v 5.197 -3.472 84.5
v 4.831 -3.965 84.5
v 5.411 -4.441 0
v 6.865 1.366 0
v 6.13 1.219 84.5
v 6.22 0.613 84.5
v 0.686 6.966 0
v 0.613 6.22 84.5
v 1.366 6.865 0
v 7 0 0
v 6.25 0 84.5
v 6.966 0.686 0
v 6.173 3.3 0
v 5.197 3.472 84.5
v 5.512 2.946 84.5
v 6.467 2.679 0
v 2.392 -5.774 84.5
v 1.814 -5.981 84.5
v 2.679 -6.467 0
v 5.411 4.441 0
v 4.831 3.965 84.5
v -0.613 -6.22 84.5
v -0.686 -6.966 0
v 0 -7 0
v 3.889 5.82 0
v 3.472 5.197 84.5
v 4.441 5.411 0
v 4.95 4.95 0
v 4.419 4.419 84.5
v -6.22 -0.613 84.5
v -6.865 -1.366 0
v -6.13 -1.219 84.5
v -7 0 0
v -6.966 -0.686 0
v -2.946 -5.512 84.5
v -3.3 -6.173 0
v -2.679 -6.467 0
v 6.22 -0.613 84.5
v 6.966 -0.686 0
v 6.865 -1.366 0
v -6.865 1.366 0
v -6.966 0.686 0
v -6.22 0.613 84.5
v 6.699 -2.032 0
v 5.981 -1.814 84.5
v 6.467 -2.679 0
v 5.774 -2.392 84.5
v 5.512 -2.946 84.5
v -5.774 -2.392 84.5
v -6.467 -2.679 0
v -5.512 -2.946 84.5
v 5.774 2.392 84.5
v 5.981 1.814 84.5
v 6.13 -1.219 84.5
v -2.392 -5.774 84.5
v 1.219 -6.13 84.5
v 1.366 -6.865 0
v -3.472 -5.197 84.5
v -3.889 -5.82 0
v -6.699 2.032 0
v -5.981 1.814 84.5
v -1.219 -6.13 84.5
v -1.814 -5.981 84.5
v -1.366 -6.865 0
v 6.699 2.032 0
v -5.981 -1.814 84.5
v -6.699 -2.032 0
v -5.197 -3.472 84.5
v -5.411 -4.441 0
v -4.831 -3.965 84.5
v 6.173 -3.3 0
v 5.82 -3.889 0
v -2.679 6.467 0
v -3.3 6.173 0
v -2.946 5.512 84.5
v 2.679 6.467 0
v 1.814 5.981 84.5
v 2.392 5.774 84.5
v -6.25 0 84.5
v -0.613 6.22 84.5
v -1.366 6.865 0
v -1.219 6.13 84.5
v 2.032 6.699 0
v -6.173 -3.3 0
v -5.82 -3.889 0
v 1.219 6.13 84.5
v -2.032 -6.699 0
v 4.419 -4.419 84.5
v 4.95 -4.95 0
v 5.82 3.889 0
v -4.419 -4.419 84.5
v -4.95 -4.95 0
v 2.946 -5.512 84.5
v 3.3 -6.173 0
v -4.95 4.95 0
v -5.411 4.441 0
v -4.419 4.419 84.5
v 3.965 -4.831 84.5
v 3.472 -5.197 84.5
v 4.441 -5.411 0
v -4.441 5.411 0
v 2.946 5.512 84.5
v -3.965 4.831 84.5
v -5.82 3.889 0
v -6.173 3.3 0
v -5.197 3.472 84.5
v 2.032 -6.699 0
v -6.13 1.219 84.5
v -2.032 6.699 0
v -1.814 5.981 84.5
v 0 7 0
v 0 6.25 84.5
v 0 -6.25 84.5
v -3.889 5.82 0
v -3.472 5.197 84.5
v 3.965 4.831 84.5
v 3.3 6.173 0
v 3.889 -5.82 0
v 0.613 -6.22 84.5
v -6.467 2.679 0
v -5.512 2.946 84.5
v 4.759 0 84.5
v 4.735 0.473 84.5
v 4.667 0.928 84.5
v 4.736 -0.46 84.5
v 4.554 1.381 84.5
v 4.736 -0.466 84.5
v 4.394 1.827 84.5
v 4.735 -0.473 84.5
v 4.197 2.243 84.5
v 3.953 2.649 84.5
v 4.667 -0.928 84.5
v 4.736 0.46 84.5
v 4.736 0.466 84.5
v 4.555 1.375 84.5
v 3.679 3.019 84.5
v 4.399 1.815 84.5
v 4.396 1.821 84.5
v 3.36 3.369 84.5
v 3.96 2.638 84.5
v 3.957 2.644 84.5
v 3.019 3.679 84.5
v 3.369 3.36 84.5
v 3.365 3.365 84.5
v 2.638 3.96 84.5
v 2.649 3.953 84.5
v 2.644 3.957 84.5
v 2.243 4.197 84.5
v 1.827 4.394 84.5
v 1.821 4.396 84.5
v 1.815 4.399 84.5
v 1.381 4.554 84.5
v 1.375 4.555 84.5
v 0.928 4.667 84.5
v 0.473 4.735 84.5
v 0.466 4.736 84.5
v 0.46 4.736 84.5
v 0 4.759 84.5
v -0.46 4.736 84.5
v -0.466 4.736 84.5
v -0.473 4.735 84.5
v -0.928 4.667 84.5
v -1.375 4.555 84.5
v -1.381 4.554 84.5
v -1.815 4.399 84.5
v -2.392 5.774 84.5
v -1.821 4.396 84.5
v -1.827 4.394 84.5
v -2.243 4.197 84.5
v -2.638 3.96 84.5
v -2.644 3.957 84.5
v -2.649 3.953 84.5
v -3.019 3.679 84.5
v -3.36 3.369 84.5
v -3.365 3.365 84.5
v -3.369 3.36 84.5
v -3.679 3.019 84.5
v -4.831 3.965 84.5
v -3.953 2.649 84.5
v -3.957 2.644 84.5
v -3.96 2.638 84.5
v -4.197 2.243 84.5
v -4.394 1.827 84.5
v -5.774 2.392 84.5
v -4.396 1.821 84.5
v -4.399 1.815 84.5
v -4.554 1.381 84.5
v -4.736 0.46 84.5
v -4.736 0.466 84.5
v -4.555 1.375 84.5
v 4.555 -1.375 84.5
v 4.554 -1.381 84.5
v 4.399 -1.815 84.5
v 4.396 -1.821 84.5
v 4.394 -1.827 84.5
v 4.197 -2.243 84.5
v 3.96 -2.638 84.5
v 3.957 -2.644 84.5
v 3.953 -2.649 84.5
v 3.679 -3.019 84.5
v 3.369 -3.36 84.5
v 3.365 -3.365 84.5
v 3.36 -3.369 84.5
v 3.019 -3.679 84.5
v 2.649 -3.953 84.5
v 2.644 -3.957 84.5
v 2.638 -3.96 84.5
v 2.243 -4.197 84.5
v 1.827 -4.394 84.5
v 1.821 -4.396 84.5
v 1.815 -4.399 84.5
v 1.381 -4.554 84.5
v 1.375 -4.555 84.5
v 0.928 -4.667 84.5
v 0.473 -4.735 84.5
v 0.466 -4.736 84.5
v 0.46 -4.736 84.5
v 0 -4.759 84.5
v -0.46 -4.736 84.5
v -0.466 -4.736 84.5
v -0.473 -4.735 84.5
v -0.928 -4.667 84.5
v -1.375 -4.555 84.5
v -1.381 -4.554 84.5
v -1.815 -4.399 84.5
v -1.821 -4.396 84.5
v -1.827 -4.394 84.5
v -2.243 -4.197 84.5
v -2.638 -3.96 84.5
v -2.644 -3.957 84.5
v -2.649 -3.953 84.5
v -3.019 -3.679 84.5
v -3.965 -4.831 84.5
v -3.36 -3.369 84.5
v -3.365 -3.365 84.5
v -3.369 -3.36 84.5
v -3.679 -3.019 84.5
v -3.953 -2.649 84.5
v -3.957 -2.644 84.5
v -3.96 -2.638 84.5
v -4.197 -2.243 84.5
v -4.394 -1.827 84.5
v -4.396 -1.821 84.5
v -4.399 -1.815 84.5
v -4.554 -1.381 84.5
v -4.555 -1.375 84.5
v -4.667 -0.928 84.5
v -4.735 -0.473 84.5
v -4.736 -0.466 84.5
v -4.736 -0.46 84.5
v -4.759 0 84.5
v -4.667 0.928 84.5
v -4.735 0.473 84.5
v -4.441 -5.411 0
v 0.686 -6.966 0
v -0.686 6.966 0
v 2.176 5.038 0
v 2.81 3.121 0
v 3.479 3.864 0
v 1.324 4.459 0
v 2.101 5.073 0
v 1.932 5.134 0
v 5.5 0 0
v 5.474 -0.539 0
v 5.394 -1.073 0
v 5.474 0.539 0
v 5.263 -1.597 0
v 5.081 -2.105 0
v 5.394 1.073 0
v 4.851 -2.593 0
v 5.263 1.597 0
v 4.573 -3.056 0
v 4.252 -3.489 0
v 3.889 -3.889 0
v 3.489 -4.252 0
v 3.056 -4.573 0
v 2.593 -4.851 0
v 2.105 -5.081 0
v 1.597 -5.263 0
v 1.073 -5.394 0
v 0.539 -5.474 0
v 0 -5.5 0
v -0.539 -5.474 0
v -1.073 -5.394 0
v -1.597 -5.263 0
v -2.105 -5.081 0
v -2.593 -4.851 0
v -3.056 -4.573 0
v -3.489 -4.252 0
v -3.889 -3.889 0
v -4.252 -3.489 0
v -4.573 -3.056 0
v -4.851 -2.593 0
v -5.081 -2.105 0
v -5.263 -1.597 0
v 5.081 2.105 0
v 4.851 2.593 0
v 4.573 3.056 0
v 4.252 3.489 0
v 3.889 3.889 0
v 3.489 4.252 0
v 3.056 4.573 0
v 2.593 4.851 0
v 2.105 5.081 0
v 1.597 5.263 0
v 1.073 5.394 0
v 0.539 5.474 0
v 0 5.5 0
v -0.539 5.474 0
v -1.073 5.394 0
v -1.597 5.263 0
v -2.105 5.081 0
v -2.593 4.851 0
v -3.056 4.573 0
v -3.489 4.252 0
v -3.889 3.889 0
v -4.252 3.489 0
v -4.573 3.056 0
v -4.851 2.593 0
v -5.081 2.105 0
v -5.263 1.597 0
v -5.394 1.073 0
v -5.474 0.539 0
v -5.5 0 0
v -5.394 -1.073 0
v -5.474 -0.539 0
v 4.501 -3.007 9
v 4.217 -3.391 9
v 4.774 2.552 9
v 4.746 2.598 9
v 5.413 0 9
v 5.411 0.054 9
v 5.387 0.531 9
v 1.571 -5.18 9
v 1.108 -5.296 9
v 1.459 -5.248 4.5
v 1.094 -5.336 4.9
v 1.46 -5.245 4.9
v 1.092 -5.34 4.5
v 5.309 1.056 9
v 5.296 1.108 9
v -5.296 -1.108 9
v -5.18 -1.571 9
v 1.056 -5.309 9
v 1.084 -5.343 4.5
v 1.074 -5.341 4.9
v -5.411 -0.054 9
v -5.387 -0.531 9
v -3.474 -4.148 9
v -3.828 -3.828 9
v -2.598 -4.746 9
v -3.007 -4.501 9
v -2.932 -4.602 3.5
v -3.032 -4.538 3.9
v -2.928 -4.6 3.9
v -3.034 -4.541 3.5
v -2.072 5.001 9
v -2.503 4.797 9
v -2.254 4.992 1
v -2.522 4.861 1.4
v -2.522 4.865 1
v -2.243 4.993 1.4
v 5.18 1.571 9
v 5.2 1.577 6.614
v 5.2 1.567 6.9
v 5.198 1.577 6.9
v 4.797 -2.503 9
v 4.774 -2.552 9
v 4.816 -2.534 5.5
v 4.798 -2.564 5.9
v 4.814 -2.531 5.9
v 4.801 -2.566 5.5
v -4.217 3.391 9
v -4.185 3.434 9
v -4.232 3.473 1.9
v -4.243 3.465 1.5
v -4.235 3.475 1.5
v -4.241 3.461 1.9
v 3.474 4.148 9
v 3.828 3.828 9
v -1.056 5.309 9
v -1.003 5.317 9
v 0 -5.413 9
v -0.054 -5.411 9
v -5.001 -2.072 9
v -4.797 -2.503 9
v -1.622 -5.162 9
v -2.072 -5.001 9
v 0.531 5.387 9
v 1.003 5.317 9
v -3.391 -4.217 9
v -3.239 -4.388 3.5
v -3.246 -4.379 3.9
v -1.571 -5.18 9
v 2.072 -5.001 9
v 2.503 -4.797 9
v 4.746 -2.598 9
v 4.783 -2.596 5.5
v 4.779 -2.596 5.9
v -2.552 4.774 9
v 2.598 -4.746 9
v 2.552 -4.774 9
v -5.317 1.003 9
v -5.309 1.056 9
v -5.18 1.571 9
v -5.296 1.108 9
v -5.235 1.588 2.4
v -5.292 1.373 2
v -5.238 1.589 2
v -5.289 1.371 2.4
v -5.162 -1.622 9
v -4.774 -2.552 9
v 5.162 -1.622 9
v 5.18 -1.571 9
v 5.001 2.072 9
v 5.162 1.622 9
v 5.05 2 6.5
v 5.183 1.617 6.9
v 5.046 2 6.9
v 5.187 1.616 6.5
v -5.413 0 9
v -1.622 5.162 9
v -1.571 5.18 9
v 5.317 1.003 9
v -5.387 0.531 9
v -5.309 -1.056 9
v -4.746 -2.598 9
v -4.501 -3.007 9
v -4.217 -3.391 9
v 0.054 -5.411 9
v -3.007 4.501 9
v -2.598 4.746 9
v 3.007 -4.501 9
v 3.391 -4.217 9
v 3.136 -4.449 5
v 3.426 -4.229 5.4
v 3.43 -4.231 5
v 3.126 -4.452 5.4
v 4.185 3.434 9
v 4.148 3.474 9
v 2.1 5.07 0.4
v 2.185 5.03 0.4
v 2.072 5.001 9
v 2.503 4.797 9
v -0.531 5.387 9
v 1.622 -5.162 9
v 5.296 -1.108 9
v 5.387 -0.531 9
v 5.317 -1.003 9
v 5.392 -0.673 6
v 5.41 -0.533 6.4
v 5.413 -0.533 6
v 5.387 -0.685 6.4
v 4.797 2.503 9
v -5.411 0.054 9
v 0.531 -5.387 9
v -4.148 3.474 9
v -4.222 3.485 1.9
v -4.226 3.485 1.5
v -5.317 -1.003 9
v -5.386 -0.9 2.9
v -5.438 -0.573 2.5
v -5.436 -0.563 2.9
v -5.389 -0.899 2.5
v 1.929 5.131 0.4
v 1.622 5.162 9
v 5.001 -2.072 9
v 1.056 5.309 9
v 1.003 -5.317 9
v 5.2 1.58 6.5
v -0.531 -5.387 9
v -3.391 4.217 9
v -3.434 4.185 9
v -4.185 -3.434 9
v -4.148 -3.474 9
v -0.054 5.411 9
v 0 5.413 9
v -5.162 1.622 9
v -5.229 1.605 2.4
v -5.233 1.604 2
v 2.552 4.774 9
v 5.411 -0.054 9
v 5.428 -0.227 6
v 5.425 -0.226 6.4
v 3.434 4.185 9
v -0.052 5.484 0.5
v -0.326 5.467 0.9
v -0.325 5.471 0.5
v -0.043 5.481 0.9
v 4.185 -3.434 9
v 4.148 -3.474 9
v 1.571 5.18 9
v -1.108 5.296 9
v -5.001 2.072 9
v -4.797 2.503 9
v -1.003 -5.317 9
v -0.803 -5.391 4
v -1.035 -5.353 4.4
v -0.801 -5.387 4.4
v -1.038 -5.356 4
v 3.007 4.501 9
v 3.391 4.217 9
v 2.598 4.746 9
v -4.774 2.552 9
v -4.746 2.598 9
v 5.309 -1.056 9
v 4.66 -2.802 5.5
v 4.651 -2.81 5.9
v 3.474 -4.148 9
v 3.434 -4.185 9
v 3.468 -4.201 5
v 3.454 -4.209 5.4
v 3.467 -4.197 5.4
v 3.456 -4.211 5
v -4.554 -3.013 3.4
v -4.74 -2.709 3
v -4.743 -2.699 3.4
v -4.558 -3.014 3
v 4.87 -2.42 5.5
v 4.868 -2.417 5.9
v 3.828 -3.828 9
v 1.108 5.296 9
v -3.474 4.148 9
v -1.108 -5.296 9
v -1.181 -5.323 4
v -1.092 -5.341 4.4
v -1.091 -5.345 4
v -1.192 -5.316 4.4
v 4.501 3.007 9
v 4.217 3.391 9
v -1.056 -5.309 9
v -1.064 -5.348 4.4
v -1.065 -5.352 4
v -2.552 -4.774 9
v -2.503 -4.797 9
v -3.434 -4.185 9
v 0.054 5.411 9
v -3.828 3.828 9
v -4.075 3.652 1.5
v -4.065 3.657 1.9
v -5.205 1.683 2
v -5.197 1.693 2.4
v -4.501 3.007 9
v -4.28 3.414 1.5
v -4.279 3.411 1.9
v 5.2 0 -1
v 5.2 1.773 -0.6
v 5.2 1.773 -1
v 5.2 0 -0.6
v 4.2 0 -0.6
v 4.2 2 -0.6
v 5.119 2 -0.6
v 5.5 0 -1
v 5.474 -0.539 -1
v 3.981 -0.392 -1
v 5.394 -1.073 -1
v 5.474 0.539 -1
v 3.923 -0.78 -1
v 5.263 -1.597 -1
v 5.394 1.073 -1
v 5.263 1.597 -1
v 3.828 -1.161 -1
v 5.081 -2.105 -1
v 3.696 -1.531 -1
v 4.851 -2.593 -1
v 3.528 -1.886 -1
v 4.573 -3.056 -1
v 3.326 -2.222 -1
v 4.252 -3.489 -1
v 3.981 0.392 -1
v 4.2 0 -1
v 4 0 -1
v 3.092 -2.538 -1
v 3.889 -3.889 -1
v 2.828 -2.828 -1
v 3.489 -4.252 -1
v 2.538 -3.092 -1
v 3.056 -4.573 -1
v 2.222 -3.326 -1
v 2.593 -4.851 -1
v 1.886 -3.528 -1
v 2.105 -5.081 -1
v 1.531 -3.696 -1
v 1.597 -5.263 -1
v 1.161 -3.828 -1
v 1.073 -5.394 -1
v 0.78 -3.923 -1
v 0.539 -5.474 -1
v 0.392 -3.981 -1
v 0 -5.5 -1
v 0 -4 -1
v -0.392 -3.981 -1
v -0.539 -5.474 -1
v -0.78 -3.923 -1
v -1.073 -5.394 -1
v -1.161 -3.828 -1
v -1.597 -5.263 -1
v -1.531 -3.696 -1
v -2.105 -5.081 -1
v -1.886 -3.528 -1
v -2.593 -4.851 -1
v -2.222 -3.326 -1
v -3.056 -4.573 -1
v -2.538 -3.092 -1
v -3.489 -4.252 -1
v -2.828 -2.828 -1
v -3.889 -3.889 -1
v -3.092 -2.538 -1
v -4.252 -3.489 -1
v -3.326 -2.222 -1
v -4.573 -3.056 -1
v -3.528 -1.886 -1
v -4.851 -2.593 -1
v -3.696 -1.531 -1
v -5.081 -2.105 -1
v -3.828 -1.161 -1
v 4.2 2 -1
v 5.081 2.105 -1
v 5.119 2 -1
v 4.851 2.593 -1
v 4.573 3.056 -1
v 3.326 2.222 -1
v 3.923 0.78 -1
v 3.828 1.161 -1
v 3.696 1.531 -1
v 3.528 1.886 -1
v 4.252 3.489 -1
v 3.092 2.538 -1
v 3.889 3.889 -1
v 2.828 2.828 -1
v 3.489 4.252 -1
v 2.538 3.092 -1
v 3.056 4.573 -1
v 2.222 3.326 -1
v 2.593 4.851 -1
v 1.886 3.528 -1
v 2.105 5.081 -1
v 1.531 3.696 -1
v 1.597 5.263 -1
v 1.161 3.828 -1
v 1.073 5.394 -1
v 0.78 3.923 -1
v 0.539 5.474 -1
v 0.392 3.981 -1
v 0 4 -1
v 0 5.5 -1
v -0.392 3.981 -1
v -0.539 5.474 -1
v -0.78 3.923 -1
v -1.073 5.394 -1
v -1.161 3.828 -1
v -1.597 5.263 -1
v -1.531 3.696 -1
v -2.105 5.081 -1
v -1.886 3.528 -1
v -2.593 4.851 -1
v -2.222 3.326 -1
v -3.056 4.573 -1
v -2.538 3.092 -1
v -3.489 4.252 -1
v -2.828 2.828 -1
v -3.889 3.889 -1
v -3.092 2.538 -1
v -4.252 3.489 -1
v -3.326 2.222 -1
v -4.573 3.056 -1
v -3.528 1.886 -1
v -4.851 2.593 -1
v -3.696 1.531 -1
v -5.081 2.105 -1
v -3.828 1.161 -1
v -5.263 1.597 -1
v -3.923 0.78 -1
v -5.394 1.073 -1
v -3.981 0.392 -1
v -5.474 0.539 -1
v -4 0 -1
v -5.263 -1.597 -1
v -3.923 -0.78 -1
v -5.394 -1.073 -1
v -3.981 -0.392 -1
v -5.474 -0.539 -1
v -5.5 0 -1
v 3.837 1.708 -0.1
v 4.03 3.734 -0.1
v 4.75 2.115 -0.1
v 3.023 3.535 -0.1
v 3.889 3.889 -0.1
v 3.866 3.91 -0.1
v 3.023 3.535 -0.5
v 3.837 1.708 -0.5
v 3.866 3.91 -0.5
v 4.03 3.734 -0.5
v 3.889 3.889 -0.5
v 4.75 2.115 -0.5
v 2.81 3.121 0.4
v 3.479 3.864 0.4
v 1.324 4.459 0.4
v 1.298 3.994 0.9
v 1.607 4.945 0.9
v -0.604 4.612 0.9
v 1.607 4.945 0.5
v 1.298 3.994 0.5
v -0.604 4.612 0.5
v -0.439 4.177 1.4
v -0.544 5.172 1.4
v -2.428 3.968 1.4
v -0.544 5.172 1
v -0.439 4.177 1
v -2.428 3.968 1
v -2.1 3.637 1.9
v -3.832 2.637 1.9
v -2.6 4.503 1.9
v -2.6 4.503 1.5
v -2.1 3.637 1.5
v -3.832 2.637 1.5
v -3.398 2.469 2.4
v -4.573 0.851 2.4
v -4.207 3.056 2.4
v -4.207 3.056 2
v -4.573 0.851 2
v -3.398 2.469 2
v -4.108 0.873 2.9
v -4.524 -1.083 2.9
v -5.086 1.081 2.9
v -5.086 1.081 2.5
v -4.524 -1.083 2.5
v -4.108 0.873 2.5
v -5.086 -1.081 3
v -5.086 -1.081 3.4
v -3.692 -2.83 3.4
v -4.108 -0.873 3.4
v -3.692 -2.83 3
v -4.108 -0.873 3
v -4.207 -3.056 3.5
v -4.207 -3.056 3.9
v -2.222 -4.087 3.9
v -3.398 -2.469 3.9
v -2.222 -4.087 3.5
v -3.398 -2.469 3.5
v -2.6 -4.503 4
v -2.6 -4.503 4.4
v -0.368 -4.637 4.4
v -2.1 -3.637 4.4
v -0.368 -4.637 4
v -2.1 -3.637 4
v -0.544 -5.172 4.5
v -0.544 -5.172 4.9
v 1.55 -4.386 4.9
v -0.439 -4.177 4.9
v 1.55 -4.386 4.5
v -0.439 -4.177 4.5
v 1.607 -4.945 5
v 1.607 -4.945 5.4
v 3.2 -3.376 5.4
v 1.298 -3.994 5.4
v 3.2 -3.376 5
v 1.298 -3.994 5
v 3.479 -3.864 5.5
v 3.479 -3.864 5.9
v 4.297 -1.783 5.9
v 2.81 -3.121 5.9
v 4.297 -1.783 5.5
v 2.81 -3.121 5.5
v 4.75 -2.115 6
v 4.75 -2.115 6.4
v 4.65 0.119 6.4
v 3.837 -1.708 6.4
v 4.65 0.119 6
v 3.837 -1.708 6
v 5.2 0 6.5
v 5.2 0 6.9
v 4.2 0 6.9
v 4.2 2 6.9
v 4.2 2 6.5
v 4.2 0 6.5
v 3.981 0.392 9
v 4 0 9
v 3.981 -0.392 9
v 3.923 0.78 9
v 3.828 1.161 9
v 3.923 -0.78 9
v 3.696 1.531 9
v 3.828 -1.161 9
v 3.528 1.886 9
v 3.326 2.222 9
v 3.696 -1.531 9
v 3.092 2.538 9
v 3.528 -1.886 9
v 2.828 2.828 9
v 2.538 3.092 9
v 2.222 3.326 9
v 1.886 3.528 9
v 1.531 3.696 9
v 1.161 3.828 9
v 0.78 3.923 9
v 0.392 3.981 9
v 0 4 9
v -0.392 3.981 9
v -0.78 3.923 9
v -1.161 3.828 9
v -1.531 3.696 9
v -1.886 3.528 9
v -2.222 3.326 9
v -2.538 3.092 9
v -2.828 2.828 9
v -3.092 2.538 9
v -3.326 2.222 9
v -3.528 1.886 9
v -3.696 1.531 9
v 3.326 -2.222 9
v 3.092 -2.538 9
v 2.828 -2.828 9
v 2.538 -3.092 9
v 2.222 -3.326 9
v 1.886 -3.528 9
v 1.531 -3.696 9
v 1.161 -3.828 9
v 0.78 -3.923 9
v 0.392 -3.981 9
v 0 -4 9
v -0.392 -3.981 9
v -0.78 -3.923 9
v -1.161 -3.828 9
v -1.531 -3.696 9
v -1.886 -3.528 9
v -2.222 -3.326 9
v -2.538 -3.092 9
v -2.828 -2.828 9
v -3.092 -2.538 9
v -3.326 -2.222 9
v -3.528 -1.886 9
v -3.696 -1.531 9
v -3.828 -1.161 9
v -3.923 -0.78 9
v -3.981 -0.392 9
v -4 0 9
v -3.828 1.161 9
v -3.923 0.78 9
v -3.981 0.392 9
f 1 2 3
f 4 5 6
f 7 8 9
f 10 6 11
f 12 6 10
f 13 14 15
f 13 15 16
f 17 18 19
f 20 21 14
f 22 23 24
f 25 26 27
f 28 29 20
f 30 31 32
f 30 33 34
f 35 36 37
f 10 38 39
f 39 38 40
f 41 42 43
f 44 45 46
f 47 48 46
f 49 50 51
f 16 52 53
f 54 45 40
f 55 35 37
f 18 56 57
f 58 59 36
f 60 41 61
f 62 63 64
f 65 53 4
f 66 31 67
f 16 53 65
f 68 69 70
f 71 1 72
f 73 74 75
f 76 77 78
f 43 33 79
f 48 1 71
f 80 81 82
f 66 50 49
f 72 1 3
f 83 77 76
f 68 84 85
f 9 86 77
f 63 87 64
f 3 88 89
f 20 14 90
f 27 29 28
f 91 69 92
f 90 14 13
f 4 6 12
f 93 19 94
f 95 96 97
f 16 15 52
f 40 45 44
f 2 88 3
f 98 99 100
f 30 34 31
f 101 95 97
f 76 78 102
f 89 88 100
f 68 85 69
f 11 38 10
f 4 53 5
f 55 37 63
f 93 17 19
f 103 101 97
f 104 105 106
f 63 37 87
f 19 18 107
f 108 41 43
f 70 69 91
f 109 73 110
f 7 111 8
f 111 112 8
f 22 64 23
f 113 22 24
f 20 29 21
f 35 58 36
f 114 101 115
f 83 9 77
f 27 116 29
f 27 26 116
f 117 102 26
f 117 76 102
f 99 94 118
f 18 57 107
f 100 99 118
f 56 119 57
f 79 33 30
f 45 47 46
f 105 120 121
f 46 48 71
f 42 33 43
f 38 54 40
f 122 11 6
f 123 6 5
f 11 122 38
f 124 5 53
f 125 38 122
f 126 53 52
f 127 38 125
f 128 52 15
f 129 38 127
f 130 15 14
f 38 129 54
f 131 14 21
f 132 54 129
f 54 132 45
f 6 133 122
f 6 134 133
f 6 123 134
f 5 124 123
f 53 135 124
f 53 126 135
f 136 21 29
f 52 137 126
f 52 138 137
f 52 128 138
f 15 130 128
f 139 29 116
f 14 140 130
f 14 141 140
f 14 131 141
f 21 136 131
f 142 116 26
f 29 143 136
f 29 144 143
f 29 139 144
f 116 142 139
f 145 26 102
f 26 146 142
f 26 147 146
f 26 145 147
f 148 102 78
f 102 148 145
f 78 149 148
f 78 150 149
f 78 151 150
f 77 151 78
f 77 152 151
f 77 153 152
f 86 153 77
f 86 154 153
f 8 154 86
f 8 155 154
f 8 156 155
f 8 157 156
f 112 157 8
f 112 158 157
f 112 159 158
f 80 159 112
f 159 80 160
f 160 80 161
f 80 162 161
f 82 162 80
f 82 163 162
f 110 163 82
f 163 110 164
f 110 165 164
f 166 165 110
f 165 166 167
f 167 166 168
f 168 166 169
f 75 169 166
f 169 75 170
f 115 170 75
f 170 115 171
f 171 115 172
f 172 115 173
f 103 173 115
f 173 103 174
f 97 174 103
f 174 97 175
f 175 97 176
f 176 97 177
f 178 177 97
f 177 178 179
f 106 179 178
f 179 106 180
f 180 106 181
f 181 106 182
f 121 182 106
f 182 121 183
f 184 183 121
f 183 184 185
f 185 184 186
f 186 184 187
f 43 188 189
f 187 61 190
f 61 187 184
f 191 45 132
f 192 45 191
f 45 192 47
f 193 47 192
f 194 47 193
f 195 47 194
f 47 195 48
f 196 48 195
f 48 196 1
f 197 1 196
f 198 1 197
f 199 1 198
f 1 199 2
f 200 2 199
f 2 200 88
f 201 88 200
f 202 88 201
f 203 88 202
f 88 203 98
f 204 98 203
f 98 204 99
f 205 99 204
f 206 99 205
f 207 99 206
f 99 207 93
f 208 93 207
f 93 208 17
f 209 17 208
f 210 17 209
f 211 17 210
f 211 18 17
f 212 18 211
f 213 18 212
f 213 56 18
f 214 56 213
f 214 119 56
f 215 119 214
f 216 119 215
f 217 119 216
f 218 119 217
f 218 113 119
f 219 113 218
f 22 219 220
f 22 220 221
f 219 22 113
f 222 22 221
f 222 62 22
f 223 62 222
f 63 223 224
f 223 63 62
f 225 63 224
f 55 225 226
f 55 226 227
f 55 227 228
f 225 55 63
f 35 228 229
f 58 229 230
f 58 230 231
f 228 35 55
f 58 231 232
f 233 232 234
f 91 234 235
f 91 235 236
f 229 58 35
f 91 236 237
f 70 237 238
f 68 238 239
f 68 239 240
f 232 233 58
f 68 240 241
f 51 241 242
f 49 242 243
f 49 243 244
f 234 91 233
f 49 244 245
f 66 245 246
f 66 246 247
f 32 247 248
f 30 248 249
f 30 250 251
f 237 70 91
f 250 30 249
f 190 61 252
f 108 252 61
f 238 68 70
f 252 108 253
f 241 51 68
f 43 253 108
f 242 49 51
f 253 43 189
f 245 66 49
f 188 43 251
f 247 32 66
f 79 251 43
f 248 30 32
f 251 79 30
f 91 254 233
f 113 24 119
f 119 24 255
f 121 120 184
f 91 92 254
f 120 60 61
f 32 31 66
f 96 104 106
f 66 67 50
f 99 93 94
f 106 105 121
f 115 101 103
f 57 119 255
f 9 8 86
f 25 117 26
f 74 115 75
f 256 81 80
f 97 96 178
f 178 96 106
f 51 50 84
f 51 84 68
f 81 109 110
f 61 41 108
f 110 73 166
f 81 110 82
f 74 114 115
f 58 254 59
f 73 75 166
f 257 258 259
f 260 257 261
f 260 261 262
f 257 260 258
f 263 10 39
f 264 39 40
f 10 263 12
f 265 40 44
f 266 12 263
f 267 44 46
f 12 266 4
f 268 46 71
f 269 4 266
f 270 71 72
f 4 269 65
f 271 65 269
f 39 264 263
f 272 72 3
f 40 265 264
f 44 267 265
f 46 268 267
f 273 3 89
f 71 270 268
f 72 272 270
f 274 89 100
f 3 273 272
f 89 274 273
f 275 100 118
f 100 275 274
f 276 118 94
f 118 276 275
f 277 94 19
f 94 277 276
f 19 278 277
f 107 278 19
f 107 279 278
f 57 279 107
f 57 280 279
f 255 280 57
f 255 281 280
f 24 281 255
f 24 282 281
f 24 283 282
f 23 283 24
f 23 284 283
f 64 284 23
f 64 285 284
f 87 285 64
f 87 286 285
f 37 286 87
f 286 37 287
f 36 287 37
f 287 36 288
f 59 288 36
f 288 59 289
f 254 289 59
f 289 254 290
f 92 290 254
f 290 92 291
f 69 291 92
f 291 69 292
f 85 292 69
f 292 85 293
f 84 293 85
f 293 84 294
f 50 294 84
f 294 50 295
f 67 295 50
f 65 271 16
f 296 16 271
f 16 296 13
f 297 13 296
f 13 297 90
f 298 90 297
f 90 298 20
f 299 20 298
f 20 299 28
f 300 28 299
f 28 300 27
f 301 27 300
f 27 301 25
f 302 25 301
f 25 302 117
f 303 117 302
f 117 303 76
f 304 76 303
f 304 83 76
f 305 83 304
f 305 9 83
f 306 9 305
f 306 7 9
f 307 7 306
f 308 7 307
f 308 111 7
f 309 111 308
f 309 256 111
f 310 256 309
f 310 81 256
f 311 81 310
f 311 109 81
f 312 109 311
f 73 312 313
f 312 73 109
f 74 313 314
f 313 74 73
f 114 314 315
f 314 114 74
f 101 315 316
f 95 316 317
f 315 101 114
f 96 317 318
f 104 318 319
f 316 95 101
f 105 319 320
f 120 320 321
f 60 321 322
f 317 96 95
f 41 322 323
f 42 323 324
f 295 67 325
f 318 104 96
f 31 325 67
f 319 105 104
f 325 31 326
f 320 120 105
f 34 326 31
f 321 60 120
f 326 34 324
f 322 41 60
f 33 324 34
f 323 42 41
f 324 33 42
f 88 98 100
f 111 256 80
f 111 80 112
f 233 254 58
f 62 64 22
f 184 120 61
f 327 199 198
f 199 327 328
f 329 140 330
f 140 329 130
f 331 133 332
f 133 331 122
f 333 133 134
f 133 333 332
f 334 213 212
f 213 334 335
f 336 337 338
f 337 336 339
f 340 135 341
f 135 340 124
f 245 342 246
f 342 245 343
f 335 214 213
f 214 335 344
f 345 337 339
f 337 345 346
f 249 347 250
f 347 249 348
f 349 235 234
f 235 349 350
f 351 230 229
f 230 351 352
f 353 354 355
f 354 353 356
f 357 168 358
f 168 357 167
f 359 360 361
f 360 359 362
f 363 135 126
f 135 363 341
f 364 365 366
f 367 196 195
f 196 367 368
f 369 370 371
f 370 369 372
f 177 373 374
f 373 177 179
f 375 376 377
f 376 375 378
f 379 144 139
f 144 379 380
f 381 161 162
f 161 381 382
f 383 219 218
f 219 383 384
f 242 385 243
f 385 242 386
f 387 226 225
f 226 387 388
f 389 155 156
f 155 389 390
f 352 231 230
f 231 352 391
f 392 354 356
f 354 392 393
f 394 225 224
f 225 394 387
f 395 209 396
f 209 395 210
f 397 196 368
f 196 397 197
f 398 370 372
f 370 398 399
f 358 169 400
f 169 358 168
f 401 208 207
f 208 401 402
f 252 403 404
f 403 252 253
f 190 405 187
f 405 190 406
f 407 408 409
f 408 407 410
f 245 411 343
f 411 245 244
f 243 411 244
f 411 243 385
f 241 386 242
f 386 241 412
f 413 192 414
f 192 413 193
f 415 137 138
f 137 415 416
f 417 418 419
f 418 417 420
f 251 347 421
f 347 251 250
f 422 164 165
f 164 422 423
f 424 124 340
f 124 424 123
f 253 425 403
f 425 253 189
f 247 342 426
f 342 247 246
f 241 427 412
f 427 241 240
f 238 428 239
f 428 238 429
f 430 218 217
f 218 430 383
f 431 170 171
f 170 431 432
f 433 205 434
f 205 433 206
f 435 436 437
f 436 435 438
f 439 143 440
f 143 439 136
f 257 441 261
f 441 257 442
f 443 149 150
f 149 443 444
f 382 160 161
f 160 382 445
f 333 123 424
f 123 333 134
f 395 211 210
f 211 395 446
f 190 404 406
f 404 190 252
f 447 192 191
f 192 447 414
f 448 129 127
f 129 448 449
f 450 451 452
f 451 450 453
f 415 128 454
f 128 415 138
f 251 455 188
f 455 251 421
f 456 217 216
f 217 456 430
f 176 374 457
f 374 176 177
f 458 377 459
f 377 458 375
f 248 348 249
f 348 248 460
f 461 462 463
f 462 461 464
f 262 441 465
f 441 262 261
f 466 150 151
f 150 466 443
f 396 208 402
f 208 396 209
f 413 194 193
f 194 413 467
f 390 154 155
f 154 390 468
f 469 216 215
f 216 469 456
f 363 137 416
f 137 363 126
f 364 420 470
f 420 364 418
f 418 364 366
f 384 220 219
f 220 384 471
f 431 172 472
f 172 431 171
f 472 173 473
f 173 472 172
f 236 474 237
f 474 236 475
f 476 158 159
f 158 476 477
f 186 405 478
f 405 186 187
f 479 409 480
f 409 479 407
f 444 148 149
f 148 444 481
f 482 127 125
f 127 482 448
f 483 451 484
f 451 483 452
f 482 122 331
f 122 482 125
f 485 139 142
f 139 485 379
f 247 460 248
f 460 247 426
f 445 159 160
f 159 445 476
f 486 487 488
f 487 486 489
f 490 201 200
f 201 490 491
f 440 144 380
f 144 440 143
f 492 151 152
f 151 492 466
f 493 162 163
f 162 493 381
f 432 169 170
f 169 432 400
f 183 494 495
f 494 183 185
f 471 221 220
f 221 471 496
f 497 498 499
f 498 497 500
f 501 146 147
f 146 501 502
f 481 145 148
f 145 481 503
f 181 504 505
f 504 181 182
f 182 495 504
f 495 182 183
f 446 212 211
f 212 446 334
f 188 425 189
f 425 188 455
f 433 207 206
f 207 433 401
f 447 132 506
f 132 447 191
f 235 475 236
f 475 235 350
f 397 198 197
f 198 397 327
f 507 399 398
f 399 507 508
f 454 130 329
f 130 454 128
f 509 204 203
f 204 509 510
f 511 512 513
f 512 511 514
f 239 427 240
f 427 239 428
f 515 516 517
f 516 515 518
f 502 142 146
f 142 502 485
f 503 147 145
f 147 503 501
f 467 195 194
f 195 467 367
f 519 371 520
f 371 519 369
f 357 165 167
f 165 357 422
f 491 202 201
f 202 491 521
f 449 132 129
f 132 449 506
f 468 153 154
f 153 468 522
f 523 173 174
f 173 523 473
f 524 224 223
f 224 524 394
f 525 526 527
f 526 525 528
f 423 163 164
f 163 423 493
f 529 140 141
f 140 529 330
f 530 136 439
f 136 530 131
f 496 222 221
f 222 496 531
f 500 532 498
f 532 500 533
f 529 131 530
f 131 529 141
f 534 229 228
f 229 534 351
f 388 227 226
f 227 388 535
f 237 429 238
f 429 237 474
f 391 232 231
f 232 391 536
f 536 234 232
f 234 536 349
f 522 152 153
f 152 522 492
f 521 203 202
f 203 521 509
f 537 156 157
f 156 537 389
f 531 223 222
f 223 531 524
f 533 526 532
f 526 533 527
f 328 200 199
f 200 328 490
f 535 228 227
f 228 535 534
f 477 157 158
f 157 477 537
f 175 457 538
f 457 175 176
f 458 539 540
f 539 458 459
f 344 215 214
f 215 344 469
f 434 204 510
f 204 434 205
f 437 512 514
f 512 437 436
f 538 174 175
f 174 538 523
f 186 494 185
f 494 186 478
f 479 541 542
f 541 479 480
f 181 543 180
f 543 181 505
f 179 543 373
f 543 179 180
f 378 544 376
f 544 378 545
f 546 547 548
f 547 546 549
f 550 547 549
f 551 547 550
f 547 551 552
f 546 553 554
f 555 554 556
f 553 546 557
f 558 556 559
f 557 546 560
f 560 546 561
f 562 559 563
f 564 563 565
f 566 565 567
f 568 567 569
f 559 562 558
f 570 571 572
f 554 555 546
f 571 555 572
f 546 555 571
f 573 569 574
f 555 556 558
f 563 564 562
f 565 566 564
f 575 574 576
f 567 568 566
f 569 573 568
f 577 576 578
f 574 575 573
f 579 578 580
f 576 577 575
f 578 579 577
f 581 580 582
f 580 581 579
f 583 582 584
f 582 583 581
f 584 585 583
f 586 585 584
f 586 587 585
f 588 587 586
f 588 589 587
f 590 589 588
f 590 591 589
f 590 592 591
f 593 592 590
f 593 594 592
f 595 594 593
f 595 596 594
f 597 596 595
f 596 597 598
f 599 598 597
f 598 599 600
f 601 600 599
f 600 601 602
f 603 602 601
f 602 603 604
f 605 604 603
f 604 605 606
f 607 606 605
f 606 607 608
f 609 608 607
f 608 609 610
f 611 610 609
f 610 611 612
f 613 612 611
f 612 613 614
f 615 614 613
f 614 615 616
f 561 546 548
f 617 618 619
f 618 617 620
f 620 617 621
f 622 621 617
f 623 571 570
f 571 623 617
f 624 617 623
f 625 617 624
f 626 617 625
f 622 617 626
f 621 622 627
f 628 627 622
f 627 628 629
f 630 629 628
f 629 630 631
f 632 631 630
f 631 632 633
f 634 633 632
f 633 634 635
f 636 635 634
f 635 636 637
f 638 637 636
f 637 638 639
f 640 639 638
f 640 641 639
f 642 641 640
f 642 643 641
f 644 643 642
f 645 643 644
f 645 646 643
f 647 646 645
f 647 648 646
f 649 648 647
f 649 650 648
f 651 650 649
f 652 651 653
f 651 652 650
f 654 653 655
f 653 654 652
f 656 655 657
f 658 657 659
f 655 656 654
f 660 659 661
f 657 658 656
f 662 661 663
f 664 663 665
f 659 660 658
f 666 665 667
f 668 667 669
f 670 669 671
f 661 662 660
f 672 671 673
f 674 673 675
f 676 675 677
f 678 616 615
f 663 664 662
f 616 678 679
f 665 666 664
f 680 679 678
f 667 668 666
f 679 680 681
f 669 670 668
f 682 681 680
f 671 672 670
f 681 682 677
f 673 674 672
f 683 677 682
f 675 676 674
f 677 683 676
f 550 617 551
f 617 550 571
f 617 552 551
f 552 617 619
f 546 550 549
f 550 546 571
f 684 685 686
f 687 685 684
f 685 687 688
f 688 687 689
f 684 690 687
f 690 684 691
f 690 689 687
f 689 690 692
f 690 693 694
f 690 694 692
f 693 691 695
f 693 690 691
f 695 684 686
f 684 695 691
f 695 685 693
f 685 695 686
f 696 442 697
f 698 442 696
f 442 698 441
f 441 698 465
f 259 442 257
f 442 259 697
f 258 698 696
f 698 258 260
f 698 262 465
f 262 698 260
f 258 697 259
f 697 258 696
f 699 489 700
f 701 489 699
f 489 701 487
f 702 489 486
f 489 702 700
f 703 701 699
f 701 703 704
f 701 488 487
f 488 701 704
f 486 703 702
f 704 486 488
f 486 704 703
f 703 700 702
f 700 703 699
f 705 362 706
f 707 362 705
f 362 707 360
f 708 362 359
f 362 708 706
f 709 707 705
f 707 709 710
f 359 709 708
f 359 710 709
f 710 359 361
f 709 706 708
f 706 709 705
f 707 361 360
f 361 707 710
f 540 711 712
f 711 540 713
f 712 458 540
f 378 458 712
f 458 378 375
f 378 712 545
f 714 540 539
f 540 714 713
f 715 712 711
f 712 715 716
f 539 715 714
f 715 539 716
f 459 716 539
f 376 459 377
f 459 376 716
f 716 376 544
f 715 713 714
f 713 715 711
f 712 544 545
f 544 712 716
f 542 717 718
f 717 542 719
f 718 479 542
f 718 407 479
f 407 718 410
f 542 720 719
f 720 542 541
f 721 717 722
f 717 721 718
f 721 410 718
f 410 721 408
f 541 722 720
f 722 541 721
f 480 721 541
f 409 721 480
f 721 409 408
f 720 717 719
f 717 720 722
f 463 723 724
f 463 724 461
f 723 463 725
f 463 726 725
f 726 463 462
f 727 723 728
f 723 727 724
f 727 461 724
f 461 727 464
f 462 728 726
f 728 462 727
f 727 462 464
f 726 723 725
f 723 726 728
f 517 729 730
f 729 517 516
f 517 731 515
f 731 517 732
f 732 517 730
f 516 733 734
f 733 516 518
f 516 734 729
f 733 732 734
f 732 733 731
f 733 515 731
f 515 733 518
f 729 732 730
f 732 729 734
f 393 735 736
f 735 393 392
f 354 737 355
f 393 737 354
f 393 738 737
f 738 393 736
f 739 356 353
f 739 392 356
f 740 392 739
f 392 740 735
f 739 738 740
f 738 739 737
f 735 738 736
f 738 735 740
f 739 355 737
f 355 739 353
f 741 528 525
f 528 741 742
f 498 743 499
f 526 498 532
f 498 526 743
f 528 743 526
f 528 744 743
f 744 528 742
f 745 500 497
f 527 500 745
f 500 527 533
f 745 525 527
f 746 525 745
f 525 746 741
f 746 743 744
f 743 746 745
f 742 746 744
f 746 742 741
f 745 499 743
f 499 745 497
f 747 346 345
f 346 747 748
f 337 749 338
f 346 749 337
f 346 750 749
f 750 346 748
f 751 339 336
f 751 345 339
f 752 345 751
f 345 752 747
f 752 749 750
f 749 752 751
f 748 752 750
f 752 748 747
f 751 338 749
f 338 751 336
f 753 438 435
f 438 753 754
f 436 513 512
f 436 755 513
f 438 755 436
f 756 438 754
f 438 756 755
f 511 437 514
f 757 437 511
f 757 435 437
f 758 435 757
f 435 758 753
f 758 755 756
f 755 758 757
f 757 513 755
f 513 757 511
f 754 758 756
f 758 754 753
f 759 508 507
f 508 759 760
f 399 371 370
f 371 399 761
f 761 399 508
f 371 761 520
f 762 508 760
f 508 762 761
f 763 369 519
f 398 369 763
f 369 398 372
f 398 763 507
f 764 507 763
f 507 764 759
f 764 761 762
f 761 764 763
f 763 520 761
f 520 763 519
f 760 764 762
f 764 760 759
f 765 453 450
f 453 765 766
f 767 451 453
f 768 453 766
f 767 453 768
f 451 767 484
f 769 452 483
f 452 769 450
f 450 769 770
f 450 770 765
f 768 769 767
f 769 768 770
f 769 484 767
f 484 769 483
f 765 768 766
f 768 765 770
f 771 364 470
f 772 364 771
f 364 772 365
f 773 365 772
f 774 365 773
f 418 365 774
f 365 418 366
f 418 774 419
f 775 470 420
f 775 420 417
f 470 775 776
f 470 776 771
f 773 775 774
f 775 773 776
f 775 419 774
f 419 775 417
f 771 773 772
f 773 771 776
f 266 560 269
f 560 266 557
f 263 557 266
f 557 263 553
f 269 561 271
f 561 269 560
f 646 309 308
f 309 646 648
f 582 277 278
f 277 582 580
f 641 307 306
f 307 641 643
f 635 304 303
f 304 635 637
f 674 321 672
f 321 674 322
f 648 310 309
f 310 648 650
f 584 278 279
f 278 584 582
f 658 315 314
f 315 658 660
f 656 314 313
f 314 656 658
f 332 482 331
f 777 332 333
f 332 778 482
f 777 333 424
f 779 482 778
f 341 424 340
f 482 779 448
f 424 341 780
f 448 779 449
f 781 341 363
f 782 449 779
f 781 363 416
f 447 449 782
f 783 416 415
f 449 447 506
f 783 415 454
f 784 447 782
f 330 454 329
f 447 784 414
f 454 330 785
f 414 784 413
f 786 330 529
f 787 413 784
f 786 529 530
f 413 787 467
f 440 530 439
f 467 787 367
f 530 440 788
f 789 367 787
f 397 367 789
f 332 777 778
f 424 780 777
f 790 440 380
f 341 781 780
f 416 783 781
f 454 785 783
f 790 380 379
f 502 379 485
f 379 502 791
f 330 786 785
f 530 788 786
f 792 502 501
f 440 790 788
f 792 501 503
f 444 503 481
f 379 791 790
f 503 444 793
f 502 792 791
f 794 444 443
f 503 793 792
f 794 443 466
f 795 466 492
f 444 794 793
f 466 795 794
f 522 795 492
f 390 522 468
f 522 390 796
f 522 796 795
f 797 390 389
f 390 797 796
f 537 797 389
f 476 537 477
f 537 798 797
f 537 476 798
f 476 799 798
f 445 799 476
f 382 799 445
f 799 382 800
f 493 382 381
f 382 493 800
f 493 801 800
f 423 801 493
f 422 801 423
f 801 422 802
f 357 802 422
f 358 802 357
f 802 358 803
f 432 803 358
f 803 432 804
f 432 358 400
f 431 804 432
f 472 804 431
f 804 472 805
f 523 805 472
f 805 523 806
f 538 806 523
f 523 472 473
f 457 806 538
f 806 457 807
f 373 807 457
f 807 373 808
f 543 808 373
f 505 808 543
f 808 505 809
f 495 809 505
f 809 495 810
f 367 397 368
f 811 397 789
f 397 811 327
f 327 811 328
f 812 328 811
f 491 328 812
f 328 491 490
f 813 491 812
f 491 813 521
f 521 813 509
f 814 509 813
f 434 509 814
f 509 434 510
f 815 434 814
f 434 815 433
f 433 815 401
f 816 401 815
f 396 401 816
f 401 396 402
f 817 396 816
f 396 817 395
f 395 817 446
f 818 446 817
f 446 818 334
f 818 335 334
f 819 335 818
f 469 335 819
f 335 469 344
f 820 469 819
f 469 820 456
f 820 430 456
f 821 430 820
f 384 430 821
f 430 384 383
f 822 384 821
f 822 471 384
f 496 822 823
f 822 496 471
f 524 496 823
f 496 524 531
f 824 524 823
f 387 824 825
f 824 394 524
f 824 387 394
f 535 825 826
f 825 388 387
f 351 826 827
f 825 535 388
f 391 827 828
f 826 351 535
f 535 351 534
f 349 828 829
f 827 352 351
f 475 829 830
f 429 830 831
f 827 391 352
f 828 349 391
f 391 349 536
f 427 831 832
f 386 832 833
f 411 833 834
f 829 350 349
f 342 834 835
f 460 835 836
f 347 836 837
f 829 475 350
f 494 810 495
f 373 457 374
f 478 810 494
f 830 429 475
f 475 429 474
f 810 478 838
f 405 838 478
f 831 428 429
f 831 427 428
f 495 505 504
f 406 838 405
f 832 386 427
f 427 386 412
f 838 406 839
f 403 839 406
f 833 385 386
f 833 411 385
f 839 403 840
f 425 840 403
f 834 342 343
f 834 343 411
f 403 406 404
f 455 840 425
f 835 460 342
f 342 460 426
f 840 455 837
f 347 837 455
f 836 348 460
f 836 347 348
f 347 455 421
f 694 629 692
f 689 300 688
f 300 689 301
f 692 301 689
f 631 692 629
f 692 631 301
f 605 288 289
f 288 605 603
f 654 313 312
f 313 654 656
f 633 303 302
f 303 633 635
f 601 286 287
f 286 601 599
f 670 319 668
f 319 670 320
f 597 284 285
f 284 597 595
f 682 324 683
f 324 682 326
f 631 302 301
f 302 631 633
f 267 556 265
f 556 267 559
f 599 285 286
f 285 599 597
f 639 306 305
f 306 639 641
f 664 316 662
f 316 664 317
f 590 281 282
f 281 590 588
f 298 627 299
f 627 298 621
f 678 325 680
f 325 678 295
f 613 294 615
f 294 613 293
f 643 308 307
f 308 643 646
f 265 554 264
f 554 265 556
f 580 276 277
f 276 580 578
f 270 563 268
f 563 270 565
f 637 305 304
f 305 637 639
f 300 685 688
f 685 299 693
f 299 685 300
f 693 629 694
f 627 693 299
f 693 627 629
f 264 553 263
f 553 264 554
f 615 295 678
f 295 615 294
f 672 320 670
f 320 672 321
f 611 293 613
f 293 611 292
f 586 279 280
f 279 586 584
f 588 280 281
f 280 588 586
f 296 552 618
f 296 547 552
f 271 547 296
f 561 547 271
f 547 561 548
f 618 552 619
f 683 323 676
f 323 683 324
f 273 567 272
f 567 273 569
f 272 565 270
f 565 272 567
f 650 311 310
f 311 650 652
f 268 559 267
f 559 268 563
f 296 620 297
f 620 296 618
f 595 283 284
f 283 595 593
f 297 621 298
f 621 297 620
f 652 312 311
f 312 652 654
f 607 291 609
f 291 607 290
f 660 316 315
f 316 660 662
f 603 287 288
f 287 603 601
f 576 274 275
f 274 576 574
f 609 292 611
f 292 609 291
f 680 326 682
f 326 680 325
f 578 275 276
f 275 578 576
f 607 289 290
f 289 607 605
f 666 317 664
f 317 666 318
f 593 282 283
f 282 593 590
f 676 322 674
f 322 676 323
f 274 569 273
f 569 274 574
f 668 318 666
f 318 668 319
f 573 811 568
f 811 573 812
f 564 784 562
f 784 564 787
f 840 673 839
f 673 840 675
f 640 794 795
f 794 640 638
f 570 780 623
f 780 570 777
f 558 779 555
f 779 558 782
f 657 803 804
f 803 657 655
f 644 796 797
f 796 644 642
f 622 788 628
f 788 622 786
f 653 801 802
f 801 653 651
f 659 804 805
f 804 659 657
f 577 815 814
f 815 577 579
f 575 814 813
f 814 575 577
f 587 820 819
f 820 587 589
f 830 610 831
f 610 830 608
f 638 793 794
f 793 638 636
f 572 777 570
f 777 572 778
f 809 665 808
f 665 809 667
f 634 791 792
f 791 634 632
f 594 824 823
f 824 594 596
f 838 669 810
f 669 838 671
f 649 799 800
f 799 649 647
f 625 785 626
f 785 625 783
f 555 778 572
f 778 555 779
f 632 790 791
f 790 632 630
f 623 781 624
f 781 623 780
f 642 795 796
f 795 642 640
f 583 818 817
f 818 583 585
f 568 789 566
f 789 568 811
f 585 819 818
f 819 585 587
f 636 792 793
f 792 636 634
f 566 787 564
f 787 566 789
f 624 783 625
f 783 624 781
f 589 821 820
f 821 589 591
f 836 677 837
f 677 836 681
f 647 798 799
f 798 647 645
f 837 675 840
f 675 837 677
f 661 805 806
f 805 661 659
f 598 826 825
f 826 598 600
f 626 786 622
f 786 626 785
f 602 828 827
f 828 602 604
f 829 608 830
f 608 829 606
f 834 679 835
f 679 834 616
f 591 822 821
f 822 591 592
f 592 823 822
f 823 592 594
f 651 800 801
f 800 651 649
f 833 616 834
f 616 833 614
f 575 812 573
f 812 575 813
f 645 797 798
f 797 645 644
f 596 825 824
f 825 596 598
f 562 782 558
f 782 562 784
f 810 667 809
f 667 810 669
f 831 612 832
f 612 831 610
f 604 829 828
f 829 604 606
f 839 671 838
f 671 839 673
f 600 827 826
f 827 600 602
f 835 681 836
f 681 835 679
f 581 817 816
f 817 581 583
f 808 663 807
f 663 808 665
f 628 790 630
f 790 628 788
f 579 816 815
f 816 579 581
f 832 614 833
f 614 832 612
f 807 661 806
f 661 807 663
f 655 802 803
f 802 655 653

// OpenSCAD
// CyberWand v21.0 - 杖身 OpenSCAD 模型
// 用于 3D 打印的 STL 文件生成（分段设计，便于打印）

// 参数设置
shaft_total_length = 338;  // 杖身总长度 mm（350-12 手柄）
shaft_segments = 4;        // 分段数量
segment_length = shaft_total_length / shaft_segments;  // 每段长度约 84.5mm

shaft_base_diameter = 14;   // 底部外径 mm
shaft_tip_diameter = 8;     // 顶端外径 mm
shaft_inner_diameter = 11;  // 底部内径 mm（容纳电池）
shaft_tip_inner_diameter = 5; // 顶端内径 mm

wall_thickness = 1.5;       // 壁厚 mm

// 螺纹连接参数
male_thread_diameter = 8;
female_thread_diameter = 8.5;
thread_length = 8;

$fn = 64;  // 圆滑度

// 模块：锥形中空管（杖身基本形状）
module tapered_tube(length, d_base_outer, d_base_inner, d_tip_outer, d_tip_inner) {
    difference() {
        // 外锥体
        cylinder(h = length, d1 = d_base_outer, d2 = d_tip_outer);
        // 内锥体（中空）
        translate([0, 0, -1])
            cylinder(h = length + 2, d1 = d_base_inner, d2 = d_tip_inner);
    }
}

// 模块：外螺纹（雄头）
module male_thread(diameter, length) {
    difference() {
        cylinder(h = length + 2, d = diameter);
        for (i = [0:15]) {
            rotate([0, 0, i * 24])
                translate([diameter/2 - 0.4, 0, i * 0.5])
                    cube([1, 2, 0.4]);
        }
    }
}

// 模块：内螺纹（雌头）
module female_thread(diameter, length) {
    difference() {
        cylinder(h = length + 2, d = diameter + 3);
        cylinder(h = length + 4, d = diameter);
        for (i = [0:15]) {
            rotate([0, 0, i * 24])
                translate([diameter/2 + 0.2, 0, i * 0.5])
                    cube([1, 2, 0.4]);
        }
    }
}

// 模块：杖身分段（第 n 段）
module shaft_segment(segment_num, total_segments) {
    t = (segment_num - 1) / (total_segments - 1);
    
    // 计算该段的直径
    d_base_outer = shaft_base_diameter - t * (shaft_base_diameter - shaft_tip_diameter);
    d_tip_outer = shaft_base_diameter - (t + 1/total_segments) * (shaft_base_diameter - shaft_tip_diameter);
    d_base_inner = shaft_inner_diameter - t * (shaft_inner_diameter - shaft_tip_inner_diameter);
    d_tip_inner = shaft_inner_diameter - (t + 1/total_segments) * (shaft_inner_diameter - shaft_tip_inner_diameter);
    
    // 第一段底部有内螺纹（连接手柄）
    if (segment_num == 1) {
        difference() {
            union() {
                tapered_tube(segment_length, d_base_outer, d_base_inner, d_tip_outer, d_tip_inner);
                // 底部内螺纹
                translate([0, 0, -1])
                    female_thread(male_thread_diameter, thread_length);
            }
            // 顶端外螺纹
            translate([0, 0, segment_length - thread_length])
                male_thread(male_thread_diameter - 1, thread_length);
        }
    }
    // 中间段
    else if (segment_num < total_segments) {
        difference() {
            union() {
                tapered_tube(segment_length, d_base_outer, d_base_inner, d_tip_outer, d_tip_inner);
                // 底部内螺纹
                translate([0, 0, -1])
                    female_thread(male_thread_diameter, thread_length);
            }
            // 顶端外螺纹
            translate([0, 0, segment_length - thread_length])
                male_thread(male_thread_diameter - 1, thread_length);
        }
    }
    // 最后一段顶端连接杖尖
    else {
        difference() {
            union() {
                tapered_tube(segment_length, d_base_outer, d_base_inner, d_tip_outer, d_tip_inner);
                // 底部内螺纹
                translate([0, 0, -1])
                    female_thread(male_thread_diameter, thread_length);
            }
            // 顶端外螺纹（连接杖尖）
            translate([0, 0, segment_length - thread_length])
                male_thread(6, thread_length);  // M6 螺纹
        }
    }
}

// 生成 4 个杖身分段
// 使用时分别导出每个分段：
// openscad -o shaft_v21_segment_1.stl -D segment_num=1 shaft_v21.scad
// openscad -o shaft_v21_segment_2.stl -D segment_num=2 shaft_v21.scad
// openscad -o shaft_v21_segment_3.stl -D segment_num=3 shaft_v21.scad
// openscad -o shaft_v21_segment_4.stl -D segment_num=4 shaft_v21.scad

segment_num = 1;  // 修改此值导出不同分段（1-4）
shaft_segment(segment_num, shaft_segments);

echo(str("导出杖身分段 ", segment_num, "/", shaft_segments));
